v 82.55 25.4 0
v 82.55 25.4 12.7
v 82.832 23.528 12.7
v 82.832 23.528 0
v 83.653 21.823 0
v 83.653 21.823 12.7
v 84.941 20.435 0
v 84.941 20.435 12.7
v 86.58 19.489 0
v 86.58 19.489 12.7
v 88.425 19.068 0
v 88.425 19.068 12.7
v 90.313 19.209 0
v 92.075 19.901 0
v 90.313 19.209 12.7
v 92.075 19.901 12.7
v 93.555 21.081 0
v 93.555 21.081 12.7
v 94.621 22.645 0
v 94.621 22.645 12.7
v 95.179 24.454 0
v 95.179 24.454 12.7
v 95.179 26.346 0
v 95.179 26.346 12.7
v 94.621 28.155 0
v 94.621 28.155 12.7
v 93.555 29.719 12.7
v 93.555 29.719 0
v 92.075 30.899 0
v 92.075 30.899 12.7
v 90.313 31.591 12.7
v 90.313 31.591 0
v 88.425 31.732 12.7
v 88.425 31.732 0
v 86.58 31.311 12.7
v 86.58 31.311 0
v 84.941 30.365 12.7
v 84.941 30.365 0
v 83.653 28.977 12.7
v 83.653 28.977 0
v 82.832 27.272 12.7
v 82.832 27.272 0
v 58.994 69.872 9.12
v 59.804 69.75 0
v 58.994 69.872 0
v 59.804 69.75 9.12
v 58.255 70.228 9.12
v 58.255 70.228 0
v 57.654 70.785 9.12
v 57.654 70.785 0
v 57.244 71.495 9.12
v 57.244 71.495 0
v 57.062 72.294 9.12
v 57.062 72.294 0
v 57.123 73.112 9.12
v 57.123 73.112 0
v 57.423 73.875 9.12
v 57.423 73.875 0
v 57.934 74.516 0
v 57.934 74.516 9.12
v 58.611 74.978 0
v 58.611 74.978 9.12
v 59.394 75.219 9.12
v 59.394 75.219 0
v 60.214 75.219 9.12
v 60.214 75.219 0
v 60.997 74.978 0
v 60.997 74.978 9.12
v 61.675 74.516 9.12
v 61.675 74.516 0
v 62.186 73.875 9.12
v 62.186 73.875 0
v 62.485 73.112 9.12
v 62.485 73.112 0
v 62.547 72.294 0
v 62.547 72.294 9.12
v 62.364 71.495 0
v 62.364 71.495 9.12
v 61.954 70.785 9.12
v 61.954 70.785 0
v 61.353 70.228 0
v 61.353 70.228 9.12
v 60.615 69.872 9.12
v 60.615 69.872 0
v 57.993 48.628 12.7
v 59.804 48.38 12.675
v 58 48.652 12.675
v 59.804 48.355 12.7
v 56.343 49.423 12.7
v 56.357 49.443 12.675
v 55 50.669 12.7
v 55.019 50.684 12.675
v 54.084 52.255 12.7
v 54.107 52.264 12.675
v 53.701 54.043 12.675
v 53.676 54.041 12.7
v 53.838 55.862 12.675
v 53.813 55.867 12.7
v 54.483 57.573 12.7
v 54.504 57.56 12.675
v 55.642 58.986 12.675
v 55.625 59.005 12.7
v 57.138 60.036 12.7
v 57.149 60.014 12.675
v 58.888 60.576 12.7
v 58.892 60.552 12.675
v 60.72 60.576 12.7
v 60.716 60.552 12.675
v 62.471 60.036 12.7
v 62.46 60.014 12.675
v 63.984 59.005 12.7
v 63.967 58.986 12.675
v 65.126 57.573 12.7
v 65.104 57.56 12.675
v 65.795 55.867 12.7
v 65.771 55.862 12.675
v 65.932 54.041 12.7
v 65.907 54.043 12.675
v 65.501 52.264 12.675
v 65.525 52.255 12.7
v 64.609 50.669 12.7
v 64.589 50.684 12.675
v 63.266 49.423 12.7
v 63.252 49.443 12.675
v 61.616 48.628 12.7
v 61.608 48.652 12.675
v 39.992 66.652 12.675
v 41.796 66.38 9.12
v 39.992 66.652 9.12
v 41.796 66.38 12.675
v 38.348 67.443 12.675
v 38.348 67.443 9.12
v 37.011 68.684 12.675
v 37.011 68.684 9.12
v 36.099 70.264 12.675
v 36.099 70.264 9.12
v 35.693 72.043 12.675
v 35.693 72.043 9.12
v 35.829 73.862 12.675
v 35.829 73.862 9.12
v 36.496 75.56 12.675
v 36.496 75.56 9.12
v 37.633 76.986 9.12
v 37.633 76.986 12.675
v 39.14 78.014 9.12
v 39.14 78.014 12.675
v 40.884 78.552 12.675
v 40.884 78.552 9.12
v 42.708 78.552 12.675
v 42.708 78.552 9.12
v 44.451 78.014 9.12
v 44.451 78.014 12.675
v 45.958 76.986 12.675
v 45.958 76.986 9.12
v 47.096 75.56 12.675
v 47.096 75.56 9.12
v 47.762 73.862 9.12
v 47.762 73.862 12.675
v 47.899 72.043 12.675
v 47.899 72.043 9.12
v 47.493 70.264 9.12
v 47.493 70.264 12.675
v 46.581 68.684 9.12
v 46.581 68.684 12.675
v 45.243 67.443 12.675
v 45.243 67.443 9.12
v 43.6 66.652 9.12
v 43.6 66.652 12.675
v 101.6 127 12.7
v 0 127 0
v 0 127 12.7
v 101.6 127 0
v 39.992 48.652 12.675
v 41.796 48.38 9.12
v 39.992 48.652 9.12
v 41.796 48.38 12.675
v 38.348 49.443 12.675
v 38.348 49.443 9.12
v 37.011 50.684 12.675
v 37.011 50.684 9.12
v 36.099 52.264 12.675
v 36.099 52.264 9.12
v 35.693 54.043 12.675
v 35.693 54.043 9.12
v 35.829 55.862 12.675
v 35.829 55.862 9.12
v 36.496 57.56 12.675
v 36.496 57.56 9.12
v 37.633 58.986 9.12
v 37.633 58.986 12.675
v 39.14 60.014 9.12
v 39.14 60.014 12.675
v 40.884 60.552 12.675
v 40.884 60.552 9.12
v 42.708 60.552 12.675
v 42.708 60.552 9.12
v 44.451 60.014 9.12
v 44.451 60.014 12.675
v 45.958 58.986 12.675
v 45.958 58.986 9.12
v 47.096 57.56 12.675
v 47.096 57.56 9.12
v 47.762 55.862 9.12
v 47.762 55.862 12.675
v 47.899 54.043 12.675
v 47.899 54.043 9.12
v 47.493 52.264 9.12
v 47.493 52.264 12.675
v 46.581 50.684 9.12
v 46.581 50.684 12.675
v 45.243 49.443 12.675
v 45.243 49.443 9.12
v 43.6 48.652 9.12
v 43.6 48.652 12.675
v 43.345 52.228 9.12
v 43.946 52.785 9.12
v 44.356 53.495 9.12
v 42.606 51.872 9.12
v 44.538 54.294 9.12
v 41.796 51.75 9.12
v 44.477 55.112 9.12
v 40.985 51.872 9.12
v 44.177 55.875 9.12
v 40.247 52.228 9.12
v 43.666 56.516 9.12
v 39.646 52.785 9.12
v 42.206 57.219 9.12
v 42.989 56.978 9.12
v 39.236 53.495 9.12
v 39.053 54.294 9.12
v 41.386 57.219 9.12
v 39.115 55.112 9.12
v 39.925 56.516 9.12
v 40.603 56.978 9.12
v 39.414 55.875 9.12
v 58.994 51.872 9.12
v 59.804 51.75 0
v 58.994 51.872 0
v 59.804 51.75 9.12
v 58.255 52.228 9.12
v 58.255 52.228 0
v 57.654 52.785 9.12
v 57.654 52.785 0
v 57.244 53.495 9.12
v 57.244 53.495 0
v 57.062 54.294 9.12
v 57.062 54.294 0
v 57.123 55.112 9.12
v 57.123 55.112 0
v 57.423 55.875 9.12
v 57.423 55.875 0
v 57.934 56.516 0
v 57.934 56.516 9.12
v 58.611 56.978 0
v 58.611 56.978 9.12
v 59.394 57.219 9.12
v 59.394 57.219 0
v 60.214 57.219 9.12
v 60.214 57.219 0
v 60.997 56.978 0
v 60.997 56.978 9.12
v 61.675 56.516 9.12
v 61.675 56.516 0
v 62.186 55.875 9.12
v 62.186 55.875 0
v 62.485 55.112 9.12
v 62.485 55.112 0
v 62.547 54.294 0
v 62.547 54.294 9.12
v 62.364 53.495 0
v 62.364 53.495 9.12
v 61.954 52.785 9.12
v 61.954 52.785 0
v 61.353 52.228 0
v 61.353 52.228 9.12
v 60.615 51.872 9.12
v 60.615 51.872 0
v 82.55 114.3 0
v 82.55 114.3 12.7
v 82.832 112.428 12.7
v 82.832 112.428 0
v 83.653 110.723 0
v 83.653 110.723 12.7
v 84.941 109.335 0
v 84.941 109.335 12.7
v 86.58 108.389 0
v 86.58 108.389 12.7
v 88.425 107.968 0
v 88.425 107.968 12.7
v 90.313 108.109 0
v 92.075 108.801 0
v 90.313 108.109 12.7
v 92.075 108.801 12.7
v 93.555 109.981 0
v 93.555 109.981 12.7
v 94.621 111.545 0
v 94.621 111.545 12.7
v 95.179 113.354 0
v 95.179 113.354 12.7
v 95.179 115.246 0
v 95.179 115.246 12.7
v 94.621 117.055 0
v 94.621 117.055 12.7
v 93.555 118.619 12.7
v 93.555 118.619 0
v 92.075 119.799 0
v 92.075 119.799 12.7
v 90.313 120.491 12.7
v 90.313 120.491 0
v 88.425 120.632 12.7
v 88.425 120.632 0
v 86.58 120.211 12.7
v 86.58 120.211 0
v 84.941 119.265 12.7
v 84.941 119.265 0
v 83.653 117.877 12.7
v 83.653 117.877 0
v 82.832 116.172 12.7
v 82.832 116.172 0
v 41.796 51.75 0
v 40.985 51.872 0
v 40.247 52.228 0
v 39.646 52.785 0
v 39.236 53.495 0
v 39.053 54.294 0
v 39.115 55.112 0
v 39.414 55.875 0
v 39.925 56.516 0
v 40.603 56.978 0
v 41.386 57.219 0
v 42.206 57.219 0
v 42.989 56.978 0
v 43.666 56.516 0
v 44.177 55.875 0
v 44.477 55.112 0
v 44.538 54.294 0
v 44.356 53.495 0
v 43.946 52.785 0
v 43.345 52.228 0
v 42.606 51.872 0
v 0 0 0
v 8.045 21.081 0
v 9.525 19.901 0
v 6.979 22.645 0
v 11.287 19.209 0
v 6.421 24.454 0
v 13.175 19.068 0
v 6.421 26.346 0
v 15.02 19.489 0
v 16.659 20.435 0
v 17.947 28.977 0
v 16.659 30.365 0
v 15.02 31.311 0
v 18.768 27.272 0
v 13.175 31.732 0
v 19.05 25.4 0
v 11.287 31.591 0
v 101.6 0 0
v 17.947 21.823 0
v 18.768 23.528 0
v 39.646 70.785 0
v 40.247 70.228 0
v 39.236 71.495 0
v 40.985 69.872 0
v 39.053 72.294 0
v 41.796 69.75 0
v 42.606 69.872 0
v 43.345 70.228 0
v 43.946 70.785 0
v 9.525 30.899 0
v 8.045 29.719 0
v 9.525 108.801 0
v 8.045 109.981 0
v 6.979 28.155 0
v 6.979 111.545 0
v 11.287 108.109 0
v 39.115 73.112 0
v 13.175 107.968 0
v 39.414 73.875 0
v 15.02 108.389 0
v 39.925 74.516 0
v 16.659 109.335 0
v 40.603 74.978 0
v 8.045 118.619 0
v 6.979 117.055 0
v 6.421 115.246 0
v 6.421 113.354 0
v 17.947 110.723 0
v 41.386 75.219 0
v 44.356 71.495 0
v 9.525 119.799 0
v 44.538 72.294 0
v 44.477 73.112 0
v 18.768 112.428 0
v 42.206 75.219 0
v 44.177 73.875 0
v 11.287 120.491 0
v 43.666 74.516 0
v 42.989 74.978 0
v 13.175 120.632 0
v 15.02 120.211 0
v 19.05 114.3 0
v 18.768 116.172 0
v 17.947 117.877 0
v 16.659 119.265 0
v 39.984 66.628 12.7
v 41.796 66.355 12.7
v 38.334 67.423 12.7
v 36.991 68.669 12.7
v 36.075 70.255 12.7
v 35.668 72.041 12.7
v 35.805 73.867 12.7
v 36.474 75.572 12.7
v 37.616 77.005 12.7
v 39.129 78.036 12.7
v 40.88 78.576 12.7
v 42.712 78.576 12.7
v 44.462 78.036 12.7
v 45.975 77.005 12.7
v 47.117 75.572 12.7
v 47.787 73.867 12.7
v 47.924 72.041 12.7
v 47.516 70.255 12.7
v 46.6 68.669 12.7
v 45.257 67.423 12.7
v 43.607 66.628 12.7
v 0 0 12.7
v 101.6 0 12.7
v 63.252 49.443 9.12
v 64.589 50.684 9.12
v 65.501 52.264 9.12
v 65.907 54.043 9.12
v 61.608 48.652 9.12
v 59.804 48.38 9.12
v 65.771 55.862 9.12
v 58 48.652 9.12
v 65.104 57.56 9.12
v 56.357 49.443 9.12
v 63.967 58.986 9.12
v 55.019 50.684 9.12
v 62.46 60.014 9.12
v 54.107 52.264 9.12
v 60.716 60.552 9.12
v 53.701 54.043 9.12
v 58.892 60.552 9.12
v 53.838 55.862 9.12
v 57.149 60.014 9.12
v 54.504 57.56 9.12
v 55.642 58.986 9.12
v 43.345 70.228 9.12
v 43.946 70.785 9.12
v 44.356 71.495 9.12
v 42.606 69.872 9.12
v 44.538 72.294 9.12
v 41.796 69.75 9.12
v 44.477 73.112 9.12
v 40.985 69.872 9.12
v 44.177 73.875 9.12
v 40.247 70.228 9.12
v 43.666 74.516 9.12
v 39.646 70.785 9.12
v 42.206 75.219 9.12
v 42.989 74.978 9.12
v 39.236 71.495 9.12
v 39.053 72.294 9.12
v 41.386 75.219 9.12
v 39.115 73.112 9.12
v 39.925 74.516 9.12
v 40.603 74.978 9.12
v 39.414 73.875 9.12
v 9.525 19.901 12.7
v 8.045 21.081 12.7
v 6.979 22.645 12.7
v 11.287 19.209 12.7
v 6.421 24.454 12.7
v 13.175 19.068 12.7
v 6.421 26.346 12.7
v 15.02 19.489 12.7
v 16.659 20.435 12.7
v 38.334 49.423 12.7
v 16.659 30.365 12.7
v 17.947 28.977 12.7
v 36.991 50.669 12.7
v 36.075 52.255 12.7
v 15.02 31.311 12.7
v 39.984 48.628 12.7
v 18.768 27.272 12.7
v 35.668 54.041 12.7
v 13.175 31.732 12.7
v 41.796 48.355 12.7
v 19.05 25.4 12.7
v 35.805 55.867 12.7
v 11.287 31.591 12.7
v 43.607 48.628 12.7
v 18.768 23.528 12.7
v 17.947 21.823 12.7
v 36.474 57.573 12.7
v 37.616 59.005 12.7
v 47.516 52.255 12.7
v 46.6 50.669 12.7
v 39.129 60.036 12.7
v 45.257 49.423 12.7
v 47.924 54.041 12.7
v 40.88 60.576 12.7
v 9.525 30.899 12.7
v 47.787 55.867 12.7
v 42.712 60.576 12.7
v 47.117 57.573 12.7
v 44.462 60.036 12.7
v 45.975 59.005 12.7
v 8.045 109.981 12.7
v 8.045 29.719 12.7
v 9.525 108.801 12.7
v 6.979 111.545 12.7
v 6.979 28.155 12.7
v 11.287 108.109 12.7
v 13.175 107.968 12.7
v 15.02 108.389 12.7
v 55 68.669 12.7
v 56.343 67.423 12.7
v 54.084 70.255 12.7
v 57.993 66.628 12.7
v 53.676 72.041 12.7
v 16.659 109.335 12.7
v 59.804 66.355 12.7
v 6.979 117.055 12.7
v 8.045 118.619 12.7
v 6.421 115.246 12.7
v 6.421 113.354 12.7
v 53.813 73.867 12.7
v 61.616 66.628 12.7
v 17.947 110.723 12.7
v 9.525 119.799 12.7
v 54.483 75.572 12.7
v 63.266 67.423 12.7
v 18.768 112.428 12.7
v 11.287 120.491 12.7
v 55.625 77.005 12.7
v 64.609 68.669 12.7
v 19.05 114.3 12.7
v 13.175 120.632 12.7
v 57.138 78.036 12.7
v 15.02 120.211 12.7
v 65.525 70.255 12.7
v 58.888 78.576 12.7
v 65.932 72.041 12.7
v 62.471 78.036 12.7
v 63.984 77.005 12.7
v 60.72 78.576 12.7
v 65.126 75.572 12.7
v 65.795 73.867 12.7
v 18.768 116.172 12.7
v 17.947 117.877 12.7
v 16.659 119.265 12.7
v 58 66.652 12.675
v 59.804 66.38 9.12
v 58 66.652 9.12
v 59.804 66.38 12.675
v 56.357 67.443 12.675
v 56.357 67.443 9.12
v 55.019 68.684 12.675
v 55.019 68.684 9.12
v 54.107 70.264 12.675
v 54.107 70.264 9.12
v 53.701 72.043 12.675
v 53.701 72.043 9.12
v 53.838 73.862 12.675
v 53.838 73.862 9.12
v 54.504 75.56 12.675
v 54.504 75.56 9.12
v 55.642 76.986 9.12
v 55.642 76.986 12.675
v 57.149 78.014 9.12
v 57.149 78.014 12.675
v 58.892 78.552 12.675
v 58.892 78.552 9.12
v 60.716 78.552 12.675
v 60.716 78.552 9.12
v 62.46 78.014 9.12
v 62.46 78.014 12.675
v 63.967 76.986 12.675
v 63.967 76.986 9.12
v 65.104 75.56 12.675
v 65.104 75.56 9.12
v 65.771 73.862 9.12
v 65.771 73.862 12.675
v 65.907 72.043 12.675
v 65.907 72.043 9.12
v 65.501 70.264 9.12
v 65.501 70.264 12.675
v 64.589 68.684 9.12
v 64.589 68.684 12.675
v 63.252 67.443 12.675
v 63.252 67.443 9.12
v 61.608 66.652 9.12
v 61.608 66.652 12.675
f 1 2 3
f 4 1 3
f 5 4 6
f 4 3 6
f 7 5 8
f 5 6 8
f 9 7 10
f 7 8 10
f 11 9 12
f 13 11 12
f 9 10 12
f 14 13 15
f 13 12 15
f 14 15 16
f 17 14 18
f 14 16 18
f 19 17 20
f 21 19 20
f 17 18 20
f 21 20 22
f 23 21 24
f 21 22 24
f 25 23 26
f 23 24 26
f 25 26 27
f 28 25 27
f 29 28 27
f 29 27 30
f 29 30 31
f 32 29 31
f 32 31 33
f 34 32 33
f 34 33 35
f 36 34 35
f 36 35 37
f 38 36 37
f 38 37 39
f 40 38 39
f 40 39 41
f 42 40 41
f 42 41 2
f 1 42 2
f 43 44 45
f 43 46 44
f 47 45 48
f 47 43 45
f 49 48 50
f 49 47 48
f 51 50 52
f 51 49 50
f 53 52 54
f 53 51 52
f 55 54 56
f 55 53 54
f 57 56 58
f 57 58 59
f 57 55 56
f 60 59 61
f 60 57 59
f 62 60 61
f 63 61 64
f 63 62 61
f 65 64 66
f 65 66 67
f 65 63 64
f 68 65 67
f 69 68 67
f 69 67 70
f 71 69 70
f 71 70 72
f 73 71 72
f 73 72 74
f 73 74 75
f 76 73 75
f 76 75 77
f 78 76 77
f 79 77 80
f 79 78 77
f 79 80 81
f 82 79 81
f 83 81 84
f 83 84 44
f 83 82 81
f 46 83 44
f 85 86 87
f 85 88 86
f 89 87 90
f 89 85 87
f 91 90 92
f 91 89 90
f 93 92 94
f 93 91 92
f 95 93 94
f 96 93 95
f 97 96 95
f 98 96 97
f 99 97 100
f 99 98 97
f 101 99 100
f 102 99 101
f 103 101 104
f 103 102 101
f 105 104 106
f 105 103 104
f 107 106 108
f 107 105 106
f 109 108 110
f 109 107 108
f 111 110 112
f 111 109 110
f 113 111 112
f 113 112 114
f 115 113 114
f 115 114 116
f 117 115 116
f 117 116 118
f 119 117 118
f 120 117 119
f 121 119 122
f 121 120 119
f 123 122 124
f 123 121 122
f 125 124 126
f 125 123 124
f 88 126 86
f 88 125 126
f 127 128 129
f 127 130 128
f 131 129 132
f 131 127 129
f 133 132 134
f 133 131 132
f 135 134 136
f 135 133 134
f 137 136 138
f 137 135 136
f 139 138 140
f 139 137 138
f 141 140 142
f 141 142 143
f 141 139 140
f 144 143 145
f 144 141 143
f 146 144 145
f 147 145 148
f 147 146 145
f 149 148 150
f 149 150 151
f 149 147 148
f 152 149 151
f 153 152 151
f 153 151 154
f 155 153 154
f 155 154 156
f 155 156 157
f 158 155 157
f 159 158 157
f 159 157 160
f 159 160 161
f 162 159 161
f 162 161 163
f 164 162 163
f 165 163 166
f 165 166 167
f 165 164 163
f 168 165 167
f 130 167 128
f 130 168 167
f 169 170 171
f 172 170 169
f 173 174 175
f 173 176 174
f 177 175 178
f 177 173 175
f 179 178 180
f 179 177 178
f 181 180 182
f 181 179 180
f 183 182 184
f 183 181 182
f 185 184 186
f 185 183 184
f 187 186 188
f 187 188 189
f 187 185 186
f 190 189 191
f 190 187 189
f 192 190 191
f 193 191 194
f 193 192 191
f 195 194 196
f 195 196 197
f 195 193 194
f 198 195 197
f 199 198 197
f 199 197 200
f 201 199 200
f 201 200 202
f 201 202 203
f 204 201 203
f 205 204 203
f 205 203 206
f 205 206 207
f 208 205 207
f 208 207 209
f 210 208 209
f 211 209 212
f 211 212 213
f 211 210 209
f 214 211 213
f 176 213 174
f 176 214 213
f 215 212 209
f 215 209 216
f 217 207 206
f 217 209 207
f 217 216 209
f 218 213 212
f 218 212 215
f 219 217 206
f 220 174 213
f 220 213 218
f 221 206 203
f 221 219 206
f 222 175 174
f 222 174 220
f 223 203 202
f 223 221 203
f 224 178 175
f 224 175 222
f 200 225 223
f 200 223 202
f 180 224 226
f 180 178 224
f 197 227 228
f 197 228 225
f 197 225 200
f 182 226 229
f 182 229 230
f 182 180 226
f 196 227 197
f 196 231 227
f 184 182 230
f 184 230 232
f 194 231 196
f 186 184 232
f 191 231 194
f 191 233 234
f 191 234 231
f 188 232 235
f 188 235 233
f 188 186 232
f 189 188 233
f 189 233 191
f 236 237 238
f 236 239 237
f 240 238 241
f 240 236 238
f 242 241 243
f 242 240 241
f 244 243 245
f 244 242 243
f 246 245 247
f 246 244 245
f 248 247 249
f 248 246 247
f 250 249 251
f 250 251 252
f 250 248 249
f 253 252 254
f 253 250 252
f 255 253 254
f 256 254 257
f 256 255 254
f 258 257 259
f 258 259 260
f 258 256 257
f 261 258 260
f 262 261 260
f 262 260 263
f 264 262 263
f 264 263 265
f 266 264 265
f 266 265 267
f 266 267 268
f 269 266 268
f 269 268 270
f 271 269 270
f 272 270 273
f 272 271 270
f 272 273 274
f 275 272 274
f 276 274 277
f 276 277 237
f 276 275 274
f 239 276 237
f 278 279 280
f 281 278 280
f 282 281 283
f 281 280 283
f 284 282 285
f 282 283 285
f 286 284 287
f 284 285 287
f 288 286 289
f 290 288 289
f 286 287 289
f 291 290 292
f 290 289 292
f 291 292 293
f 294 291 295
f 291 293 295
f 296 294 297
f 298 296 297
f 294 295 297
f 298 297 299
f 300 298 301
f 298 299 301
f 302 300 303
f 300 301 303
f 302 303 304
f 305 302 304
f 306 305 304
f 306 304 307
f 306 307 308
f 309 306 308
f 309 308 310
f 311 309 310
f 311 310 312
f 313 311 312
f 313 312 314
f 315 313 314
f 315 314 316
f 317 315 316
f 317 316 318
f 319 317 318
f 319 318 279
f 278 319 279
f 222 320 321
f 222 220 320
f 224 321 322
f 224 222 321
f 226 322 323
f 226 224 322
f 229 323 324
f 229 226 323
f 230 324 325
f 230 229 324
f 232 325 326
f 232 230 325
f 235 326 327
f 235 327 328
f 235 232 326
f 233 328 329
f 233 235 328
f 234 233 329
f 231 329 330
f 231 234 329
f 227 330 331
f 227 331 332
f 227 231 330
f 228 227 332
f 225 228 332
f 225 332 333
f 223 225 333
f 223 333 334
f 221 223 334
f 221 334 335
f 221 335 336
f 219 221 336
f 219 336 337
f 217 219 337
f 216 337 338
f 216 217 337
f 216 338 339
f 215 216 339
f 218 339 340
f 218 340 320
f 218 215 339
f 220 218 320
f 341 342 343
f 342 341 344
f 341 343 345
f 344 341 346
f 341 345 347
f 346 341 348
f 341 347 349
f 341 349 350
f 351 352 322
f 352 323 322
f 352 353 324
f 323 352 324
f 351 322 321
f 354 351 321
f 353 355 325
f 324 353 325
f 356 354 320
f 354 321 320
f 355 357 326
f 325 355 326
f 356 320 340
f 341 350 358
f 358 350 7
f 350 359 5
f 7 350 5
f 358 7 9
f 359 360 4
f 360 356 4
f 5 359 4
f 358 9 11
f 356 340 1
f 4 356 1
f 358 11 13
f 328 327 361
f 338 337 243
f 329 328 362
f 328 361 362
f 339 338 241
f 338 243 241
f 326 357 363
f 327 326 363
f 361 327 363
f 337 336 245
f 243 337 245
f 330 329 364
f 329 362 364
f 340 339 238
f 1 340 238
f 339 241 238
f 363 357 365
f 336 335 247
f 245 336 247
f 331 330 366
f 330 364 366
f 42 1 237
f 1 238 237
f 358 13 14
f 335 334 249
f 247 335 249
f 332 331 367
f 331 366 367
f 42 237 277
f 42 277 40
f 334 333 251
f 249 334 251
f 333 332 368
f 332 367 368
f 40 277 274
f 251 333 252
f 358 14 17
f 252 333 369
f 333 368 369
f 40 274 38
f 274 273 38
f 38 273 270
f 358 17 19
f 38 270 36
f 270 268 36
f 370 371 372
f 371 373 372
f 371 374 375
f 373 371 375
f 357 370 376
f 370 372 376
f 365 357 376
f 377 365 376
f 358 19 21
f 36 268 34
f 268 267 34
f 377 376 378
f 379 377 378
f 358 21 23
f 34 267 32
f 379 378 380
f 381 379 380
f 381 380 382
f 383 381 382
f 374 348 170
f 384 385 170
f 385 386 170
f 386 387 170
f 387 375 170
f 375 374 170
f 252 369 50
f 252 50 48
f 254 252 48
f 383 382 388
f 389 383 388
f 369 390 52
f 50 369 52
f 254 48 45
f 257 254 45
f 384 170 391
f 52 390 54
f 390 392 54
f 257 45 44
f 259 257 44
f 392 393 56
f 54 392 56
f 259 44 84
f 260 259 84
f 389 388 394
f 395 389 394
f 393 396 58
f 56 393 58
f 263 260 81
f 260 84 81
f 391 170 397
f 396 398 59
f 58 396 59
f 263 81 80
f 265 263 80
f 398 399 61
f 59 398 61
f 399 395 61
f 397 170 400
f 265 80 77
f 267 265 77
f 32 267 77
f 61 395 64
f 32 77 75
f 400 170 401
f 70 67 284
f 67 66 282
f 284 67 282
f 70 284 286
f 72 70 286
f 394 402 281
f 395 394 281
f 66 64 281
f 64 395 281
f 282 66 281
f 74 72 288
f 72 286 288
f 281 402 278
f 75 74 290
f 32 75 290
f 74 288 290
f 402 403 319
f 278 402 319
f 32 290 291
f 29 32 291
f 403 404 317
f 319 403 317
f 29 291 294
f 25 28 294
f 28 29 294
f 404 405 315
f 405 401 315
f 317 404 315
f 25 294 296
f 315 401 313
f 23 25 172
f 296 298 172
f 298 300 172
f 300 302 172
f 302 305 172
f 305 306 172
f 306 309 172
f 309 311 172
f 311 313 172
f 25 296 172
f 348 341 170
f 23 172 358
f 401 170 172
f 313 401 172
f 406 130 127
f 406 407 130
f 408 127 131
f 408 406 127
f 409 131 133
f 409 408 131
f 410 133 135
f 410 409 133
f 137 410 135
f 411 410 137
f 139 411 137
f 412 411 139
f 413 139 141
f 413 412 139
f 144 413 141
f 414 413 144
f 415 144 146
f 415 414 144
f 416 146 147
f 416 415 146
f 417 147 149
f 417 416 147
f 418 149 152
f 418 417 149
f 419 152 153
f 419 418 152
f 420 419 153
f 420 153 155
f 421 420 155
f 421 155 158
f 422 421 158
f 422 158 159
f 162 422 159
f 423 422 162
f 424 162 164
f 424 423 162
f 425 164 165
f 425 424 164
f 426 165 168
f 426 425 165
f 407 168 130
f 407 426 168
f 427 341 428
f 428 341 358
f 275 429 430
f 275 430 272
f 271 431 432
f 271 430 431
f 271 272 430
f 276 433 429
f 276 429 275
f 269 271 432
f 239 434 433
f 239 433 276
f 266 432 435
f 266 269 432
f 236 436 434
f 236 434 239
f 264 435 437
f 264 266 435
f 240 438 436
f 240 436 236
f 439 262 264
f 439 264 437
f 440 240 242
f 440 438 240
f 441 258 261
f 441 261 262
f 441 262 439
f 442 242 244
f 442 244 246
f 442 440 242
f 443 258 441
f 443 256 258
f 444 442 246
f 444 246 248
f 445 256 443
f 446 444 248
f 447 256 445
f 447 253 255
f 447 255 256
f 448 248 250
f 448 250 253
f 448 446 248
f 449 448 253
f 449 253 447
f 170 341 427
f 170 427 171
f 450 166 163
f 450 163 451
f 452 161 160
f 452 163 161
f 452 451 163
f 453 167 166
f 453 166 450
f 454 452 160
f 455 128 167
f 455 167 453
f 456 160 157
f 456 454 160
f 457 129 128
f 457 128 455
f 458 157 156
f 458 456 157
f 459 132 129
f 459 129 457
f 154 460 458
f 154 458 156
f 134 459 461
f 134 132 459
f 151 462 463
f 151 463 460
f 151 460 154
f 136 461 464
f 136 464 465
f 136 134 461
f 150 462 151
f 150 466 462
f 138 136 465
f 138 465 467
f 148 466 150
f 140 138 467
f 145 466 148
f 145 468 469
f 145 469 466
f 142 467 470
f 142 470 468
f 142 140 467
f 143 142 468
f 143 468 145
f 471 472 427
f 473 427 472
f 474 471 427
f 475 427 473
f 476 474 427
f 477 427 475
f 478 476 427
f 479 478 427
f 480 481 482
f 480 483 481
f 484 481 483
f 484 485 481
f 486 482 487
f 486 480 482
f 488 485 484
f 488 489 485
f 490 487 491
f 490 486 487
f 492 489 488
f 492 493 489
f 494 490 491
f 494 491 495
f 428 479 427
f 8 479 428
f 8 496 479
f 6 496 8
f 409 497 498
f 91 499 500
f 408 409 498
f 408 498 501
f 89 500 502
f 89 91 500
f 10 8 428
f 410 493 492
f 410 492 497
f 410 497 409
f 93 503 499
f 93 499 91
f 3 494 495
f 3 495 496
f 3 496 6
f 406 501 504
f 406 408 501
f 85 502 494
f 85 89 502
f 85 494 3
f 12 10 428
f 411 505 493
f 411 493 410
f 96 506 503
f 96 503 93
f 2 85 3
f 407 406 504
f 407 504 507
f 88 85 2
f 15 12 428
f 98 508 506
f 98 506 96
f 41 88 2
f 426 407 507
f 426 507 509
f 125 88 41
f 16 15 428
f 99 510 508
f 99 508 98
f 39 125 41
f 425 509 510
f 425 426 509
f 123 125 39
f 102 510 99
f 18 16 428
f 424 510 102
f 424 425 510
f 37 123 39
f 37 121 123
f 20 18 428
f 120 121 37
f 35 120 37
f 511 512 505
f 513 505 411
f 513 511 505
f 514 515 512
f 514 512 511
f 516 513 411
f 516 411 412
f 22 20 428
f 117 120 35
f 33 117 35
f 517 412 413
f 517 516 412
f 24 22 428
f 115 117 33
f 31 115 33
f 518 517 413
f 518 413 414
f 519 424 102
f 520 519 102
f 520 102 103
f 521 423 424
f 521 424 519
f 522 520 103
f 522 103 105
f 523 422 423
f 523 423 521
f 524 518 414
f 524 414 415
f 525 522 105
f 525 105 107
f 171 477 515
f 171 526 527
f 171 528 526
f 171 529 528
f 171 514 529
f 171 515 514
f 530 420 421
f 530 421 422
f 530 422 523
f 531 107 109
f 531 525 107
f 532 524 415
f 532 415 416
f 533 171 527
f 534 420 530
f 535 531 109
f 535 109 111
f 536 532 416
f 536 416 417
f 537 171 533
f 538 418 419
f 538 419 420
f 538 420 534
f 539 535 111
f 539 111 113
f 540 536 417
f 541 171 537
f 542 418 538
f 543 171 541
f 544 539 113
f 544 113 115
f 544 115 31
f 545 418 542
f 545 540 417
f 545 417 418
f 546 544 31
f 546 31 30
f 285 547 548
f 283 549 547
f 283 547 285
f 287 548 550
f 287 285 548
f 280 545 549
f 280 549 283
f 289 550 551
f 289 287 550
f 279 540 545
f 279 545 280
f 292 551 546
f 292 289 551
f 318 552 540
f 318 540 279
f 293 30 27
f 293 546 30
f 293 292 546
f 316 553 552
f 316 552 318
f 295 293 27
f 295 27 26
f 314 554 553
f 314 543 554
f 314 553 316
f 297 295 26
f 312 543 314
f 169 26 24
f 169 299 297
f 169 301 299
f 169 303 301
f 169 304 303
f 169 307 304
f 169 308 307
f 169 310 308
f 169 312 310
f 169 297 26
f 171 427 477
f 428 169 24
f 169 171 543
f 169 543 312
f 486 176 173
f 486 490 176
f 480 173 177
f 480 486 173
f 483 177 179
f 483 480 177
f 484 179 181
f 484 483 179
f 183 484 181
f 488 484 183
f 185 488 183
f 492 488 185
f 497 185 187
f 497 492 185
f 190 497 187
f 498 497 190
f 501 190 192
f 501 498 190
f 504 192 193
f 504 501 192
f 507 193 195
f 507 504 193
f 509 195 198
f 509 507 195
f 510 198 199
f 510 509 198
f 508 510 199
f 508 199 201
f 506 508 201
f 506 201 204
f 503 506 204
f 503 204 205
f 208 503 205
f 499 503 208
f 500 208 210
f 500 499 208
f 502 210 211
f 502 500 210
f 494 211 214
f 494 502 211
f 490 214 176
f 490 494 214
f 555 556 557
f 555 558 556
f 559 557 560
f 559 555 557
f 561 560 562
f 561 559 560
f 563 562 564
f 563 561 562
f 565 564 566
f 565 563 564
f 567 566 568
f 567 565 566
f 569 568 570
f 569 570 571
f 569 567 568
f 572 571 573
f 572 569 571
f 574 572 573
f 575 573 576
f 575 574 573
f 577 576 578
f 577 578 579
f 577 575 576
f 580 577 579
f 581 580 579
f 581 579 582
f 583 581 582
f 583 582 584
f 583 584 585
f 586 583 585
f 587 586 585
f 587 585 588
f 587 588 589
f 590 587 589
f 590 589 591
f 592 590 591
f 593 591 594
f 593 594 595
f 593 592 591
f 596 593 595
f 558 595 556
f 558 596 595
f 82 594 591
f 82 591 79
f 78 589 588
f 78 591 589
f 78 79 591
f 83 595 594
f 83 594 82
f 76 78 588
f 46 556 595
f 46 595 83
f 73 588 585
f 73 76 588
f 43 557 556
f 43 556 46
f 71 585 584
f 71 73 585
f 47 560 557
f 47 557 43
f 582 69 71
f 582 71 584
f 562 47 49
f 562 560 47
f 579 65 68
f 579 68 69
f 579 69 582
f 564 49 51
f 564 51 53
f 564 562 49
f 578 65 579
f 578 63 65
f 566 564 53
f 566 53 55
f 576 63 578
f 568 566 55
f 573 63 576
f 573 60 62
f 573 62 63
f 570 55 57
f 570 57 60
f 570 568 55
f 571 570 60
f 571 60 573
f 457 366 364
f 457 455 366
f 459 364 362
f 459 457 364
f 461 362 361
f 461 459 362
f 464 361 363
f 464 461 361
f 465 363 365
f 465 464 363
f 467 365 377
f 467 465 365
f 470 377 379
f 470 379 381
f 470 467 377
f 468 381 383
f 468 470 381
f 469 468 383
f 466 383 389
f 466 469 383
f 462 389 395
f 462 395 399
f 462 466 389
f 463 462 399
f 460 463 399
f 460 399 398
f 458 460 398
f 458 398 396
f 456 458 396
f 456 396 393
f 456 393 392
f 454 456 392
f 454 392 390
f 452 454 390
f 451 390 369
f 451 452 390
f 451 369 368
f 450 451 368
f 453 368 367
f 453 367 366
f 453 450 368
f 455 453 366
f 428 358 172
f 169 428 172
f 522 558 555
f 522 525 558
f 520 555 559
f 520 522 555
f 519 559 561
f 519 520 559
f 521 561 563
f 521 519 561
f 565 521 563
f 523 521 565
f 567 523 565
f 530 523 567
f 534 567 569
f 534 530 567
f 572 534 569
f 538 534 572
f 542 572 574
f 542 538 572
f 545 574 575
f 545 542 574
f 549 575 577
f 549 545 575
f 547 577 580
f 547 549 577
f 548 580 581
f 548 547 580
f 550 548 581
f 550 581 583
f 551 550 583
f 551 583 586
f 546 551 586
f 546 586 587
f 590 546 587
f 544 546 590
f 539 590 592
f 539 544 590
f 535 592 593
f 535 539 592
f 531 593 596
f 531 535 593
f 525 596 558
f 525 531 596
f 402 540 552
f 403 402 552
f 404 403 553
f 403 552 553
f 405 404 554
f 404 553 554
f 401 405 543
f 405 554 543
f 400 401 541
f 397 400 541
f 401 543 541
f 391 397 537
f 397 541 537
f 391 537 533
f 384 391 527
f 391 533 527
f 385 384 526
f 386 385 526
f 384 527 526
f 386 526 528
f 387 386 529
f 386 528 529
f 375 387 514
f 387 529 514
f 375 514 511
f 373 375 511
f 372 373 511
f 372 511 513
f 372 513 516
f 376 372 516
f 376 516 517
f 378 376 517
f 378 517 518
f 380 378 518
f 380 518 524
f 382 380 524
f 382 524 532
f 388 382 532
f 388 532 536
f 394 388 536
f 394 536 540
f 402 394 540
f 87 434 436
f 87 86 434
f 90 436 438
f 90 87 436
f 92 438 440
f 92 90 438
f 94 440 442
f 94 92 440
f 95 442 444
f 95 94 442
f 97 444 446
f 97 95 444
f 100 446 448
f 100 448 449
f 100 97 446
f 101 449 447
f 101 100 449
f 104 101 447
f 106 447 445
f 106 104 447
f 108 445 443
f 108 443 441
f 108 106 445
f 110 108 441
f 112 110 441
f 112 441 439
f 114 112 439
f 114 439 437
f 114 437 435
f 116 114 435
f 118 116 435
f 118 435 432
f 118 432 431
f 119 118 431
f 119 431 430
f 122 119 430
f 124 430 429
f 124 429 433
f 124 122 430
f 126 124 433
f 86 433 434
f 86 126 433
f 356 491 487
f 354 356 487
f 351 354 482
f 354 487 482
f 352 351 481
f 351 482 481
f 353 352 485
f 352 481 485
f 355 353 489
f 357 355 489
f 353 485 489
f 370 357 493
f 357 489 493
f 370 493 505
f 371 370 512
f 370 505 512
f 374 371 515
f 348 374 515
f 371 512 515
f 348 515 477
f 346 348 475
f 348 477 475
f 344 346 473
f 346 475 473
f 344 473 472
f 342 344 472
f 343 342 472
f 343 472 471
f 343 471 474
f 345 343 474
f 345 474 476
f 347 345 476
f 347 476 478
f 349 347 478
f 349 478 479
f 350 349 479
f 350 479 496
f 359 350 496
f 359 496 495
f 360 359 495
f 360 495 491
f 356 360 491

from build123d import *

# Parameters (mm, degrees)
SKETCH1_W                              = 101.6
SKETCH1_H                              = 127
BOSS_EXTRUDE1_DEPTH                    = 12.7
SKETCH4_R                              = 6.35
CUT_EXTRUDE9_DEPTH                     = 164.134453749
CBORE_FOR_M5_HEX_HEAD_BOLT1_AT_2_COUNT = 2
CBORE_FOR_M5_HEX_HEAD_BOLT1_AT_2_PITCH = 18.0086
CBORE_FOR_M5_HEX_HEAD_BOLT1_AT_3_COUNT = 2
CBORE_FOR_M5_HEX_HEAD_BOLT1_AT_3_PITCH = 25.461925967
CBORE_FOR_M5_HEX_HEAD_BOLT1_AT_4_COUNT = 2
CBORE_FOR_M5_HEX_HEAD_BOLT1_AT_4_PITCH = 18


with BuildPart() as part:
    # Sketch1 → Boss-Extrude1 (new body)
    with BuildSketch(Plane.XY):
        with Locations((50.8, 63.5)):
            Rectangle(SKETCH1_W, SKETCH1_H)
    extrude(amount=BOSS_EXTRUDE1_DEPTH)

    # Sketch4 → Cut-Extrude9 (cut, through all)
    with BuildSketch(Plane.XY.offset(12.7)):
        with Locations((12.7, 114.3)):
            Circle(SKETCH4_R)
        with Locations((12.7, 25.4)):
            Circle(SKETCH4_R)
        with Locations(Location((88.9, 25.4, 0), (0, 0, 180))):
            Circle(SKETCH4_R)
        with Locations(Location((88.9, 114.3, 0), (0, 0, 180))):
            Circle(SKETCH4_R)
    extrude(amount=-CUT_EXTRUDE9_DEPTH, mode=Mode.SUBTRACT)

    # Sketch8 → CBORE for M5 Hex Head Bolt1 (revolve, cut)
    with BuildSketch(Plane(origin=(41.7957, 72.5, 12.7), x_dir=(0, -1, 0), z_dir=(1, 0, 0))):
        Polygon((0, 0), (0, 12.7), (2.75, 12.7), (2.75, 3.58), (6.12, 3.58), (6.12, 0.025), (6.145, 0), align=None)
    cbore_for_m5_hex_head_bolt1 = revolve(axis=Axis((41.7957, 72.5, 19.05), (0, 0, -1)), mode=Mode.SUBTRACT)

    # CBORE for M5 Hex Head Bolt1 at 2: CBORE for M5 Hex Head Bolt1 ×2
    with Locations(*[(i * CBORE_FOR_M5_HEX_HEAD_BOLT1_AT_2_PITCH, 0, 0) for i in range(1, CBORE_FOR_M5_HEX_HEAD_BOLT1_AT_2_COUNT)]):
        add(cbore_for_m5_hex_head_bolt1, mode=Mode.SUBTRACT)

    # CBORE for M5 Hex Head Bolt1 at 3: CBORE for M5 Hex Head Bolt1 ×2
    with Locations(*[Vector(0.7072756406246394, -0.7069378814146302, 0) * (i * CBORE_FOR_M5_HEX_HEAD_BOLT1_AT_3_PITCH) for i in range(1, CBORE_FOR_M5_HEX_HEAD_BOLT1_AT_3_COUNT)]):
        add(cbore_for_m5_hex_head_bolt1, mode=Mode.SUBTRACT)

    # CBORE for M5 Hex Head Bolt1 at 4: CBORE for M5 Hex Head Bolt1 ×2
    with Locations(*[(0, -i * CBORE_FOR_M5_HEX_HEAD_BOLT1_AT_4_PITCH, 0) for i in range(1, CBORE_FOR_M5_HEX_HEAD_BOLT1_AT_4_COUNT)]):
        add(cbore_for_m5_hex_head_bolt1, mode=Mode.SUBTRACT)


solid = part.part
